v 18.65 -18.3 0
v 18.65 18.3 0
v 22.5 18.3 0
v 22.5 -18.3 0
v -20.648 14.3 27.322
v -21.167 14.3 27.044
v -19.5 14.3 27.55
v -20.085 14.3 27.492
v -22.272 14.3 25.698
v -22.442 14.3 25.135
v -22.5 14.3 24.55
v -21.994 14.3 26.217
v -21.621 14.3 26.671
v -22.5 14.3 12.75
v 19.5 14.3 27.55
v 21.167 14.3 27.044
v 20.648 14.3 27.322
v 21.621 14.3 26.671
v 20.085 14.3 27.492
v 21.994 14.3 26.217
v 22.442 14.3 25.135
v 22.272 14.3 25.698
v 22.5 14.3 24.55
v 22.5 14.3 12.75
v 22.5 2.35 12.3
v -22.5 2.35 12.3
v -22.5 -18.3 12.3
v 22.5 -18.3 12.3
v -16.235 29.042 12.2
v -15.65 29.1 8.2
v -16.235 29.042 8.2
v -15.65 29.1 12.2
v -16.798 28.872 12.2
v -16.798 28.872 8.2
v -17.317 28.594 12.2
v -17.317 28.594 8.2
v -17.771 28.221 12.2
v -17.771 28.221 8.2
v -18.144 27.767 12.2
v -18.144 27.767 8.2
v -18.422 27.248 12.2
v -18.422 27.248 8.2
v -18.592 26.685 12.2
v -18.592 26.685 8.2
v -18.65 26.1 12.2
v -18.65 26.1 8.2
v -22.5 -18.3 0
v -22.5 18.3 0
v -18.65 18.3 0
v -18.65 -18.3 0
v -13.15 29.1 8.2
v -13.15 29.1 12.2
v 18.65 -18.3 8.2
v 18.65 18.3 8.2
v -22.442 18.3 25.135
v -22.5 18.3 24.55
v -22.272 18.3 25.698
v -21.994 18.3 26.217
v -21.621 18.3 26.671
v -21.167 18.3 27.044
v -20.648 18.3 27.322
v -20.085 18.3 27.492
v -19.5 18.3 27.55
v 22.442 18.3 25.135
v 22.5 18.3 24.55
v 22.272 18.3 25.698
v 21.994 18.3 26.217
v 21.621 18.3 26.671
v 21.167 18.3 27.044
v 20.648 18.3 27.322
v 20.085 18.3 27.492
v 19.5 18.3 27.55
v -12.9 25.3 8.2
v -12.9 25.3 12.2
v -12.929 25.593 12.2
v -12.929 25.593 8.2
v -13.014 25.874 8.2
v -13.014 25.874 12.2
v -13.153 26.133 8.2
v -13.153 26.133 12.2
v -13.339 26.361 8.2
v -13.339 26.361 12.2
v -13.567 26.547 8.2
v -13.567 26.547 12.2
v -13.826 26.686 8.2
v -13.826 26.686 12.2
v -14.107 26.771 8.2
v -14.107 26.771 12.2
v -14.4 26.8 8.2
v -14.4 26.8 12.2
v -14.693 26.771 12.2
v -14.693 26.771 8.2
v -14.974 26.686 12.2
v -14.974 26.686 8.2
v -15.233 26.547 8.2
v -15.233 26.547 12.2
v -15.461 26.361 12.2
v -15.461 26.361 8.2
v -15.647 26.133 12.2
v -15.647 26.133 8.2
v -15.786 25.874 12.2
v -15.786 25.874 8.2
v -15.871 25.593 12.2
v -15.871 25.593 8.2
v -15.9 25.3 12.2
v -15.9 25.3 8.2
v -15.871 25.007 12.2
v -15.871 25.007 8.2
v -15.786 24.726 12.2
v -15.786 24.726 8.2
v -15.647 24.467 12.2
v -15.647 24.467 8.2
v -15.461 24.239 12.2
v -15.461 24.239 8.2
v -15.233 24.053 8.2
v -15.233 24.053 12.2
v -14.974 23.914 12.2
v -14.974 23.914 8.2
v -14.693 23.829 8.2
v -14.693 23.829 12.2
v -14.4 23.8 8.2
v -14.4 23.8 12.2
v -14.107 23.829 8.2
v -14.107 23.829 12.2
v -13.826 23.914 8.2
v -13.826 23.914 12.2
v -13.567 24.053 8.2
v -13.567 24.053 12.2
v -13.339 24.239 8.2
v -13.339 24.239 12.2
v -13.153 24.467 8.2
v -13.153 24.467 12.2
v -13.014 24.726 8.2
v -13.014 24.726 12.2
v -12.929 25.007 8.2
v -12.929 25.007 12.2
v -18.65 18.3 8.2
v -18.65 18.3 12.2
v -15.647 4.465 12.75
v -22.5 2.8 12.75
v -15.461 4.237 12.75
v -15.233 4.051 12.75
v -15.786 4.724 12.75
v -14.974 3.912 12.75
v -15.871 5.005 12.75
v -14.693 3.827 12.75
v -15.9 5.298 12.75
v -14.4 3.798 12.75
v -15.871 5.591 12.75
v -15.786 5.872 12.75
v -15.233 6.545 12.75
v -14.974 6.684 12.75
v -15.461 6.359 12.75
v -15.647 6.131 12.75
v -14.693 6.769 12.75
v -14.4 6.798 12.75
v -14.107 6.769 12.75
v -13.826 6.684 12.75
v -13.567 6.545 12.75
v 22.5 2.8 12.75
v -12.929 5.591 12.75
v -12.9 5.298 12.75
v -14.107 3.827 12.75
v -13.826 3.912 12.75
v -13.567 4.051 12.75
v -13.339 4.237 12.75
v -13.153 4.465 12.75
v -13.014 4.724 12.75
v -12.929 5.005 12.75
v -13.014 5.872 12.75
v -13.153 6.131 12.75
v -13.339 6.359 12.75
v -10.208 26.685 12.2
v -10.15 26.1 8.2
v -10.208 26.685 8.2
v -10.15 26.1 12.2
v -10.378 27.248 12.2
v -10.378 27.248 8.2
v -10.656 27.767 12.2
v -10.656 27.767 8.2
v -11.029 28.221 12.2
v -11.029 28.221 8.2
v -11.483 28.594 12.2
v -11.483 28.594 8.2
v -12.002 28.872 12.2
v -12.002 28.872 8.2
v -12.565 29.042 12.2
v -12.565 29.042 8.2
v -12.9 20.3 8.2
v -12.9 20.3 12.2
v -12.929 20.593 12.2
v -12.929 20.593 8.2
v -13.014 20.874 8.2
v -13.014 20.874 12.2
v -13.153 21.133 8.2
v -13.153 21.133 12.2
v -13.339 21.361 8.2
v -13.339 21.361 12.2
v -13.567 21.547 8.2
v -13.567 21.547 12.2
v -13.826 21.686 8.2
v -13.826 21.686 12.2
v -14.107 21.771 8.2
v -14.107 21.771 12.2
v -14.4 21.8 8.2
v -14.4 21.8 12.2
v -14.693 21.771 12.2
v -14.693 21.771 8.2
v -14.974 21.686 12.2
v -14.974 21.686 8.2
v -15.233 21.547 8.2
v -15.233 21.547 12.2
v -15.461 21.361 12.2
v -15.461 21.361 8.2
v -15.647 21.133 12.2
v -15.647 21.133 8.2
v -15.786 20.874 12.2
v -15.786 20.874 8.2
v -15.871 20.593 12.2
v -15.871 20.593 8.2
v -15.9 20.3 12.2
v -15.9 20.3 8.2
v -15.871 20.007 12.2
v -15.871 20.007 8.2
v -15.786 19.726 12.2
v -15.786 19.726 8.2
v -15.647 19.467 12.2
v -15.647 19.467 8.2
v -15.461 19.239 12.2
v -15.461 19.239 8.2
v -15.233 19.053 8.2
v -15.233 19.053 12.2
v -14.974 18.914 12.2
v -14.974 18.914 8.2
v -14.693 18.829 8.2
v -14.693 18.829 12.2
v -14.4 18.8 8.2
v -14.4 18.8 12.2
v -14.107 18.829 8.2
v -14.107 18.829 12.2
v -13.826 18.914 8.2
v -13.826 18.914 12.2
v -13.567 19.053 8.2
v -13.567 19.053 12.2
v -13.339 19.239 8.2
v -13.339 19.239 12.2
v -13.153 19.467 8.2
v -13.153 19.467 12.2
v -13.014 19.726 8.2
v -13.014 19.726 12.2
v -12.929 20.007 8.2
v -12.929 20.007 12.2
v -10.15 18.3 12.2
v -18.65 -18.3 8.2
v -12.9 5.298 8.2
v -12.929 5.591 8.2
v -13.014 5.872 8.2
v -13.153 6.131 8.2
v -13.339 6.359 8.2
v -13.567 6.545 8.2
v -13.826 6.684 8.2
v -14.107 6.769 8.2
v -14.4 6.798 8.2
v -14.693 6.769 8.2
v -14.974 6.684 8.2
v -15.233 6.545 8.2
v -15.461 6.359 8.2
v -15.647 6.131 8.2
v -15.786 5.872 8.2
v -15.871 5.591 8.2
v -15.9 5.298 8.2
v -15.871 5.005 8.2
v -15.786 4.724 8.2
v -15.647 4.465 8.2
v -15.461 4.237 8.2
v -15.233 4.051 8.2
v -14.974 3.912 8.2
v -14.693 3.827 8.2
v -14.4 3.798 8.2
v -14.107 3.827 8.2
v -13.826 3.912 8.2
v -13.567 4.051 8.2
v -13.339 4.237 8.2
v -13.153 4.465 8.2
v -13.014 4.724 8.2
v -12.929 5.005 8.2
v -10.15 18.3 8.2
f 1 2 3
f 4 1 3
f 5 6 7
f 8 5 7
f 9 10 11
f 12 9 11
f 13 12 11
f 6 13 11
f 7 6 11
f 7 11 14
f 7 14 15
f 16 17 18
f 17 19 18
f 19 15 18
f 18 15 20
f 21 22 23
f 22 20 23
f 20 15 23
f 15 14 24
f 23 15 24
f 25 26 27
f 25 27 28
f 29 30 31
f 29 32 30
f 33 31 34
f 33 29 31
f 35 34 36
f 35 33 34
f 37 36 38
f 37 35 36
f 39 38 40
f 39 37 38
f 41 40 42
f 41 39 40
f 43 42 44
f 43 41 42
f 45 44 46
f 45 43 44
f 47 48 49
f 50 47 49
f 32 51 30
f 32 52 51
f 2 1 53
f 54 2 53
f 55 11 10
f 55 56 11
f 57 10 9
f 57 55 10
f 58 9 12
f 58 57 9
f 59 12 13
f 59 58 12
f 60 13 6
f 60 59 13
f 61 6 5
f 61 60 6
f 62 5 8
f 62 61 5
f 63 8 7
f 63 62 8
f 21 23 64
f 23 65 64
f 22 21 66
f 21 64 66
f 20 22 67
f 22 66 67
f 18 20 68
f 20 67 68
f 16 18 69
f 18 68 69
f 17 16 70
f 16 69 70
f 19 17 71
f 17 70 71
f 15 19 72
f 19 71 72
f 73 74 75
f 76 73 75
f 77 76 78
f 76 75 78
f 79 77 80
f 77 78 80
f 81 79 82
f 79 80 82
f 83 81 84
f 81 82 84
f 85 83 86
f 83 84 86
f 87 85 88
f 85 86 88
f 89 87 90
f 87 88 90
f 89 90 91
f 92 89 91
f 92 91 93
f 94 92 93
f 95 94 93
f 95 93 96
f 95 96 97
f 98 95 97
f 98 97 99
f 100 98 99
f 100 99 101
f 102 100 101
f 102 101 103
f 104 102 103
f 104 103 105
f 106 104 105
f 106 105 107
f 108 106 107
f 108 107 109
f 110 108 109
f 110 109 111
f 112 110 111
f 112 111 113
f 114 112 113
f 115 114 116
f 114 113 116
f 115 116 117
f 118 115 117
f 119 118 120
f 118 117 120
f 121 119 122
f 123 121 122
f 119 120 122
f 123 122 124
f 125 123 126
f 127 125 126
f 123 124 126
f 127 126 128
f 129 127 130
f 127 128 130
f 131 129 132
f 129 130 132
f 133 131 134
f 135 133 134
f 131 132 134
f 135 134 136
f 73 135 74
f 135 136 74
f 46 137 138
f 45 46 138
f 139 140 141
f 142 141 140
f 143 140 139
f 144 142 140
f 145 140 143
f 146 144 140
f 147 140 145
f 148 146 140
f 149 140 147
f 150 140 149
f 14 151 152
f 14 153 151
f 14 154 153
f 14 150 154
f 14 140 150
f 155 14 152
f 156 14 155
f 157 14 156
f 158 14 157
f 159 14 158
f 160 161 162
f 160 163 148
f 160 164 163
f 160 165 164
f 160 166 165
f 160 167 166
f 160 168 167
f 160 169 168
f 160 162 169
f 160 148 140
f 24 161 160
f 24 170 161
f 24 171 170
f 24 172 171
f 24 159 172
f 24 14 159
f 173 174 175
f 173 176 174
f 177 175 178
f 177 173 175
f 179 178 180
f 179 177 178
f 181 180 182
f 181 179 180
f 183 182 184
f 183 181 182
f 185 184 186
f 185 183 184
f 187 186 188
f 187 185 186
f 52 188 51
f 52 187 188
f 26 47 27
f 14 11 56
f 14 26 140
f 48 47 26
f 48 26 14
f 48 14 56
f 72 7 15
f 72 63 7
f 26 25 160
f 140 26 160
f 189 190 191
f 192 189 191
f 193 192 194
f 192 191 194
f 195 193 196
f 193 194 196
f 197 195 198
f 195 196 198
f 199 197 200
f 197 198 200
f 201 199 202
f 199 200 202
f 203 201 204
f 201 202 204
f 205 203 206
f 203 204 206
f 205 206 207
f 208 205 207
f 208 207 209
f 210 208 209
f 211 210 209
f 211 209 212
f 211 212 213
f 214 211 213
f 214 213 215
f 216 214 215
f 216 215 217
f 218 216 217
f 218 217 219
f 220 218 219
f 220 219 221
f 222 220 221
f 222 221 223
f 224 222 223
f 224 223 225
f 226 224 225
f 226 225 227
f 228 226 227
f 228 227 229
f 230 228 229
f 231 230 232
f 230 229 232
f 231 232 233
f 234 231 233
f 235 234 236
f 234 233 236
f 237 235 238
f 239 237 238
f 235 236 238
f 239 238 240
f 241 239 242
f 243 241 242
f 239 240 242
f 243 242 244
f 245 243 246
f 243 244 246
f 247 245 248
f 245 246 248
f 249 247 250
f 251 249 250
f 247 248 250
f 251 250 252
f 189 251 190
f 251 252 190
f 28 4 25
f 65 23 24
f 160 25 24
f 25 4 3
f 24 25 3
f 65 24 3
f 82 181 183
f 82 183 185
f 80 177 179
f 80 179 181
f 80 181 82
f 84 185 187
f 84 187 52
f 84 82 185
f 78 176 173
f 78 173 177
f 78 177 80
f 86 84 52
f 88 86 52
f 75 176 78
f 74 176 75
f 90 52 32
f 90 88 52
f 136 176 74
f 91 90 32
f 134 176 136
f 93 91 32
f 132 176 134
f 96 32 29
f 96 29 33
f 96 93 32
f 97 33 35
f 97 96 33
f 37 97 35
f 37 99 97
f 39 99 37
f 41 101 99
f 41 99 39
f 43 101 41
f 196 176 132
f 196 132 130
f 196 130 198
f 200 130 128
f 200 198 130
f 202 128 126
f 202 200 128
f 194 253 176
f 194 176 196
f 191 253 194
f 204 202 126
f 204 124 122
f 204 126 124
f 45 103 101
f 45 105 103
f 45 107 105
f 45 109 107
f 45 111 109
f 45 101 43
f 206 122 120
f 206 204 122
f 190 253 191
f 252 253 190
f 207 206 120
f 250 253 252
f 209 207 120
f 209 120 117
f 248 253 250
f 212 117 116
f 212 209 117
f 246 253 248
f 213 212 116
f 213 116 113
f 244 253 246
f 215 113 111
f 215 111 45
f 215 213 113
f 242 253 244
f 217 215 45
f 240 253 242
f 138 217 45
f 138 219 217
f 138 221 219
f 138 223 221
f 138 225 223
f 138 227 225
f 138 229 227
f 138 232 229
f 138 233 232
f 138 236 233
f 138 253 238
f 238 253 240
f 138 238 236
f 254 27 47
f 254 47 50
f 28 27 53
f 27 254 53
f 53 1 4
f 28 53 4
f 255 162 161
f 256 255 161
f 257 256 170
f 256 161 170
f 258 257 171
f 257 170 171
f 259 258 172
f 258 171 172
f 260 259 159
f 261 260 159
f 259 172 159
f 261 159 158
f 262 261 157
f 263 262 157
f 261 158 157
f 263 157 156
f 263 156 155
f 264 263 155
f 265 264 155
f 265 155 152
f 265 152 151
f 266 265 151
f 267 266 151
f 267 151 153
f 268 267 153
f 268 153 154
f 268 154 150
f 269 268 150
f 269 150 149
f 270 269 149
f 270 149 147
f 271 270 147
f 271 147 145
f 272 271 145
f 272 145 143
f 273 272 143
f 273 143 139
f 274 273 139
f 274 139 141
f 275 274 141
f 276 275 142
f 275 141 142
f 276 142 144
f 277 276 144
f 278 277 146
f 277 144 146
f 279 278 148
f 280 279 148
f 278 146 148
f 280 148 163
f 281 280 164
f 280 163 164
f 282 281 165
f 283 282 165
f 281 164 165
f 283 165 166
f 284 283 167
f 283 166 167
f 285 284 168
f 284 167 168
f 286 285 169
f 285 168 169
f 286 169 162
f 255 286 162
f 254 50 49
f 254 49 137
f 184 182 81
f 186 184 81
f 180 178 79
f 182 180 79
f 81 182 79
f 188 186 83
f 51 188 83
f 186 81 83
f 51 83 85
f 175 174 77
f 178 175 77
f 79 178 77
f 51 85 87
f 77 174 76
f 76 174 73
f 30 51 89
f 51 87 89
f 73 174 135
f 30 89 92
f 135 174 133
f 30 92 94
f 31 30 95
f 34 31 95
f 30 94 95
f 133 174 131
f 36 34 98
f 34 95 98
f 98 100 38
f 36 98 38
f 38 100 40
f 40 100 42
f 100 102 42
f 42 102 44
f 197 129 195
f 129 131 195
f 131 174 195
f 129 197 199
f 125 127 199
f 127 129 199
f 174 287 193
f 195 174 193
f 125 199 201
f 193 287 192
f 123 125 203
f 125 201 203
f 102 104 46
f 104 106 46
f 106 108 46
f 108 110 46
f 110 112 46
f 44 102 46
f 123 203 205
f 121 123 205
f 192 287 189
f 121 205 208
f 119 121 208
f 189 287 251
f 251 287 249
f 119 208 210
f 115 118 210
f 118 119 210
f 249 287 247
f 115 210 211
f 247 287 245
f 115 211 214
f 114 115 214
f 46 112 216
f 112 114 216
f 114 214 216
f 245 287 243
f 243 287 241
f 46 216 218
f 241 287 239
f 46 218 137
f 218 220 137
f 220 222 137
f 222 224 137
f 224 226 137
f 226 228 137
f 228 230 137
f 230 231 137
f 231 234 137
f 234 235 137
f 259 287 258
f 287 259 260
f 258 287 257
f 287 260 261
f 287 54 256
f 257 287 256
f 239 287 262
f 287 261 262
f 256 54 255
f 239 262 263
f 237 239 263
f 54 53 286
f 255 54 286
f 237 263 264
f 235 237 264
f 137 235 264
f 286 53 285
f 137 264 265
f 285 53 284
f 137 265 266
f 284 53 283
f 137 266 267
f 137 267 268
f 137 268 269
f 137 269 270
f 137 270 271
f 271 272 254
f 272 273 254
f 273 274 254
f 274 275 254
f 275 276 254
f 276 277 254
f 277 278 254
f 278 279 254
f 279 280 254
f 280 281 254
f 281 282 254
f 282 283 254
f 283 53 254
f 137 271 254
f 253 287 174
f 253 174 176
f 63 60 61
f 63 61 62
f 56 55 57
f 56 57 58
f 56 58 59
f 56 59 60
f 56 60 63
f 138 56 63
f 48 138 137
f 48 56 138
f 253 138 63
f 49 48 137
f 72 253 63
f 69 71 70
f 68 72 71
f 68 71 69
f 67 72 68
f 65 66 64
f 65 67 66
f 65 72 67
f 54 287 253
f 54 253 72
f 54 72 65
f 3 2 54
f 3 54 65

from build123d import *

# Parameters (mm, degrees)
F0_W        = 45
F0_H        = 36.6
F1_DEPTH    = 12.3
F2_W        = 37.3
F2_H        = 8.2
F3_DEPTH    = 36.601
F4_W        = 45
F4_H        = 16
F5_DEPTH    = 0.45
F6_T4_DEPTH = 47.571682988
F7_W        = 45
F7_H        = 4
F8_DEPTH    = 14.8
F9_R        = 3
F10_W       = 8.5
F10_H       = 4
F11_DEPTH   = 10.8
F12_R       = 3
F13_R       = 1.5
F14_DEPTH   = 25
F15_R       = 1.5
F16_DEPTH   = 25


# Not quite as in the source:
# - a fillet or chamfer that OpenCascade refuses, or shapes differently, is made with other operations: its cross-section is extruded or revolved along the edge and cut away or added


with BuildPart() as f1:
    # F0 (on Top) → F1 (new body)
    with BuildSketch(Plane.XY):
        Rectangle(F0_W, F0_H)
    extrude(amount=F1_DEPTH)

    # F2 (on face) → F3 (cut, through all)
    with BuildSketch(Plane.XZ.offset(18.3)):
        with Locations((0, 4.1)):
            Rectangle(F2_W, F2_H)
    extrude(amount=-F3_DEPTH, mode=Mode.SUBTRACT)

    # F4 (on face) → F5 (join)
    with BuildSketch(Plane.XY.offset(12.3)):
        with Locations((0, 10.3)):
            Rectangle(F4_W, F4_H)
    extrude(amount=F5_DEPTH)

    # F6: chamfer of 0.5 on 1 edges, made by hand


with BuildPart() as f6_tool2:
    # F6_s3 → F6_t4 (new body)
    with BuildSketch(Plane.YZ.offset(-23.785841494)):
        Polygon((2.3, 12.25), (2.8, 12.75), (2.3, 12.75), align=None)
    extrude(amount=F6_T4_DEPTH)

    split(bisect_by=Plane.XY.offset(12.3), keep=Keep.TOP)


with BuildPart() as f1_1:
    add(f1.part)

    # F6_t1: cut F6_tool2
    add(f6_tool2.part, mode=Mode.SUBTRACT)

    # F7 (on face) → F8 (join)
    with BuildSketch(Plane.XY.offset(12.75)):
        with Locations((0, 16.3)):
            Rectangle(F7_W, F7_H)
    extrude(amount=F8_DEPTH)

    # F9
    f9_edges = [f1_1.edges().sort_by_distance(p)[0] for p in [
        (-22.5, 16.3, 27.55),
        (22.5, 16.3, 27.55),
    ]]
    fillet(f9_edges, radius=F9_R)

    # F10 (on face) → F11 (join)
    with BuildSketch(Plane(origin=(0, 18.3, 0), x_dir=(-1, 0, 0), z_dir=(0, 1, 0))):
        with Locations((14.4, 10.2)):
            Rectangle(F10_W, F10_H)
    extrude(amount=F11_DEPTH)

    # F12
    f12_edges = [f1_1.edges().sort_by_distance(p)[0] for p in [
        (-10.15, 29.1, 10.2),
        (-18.65, 29.1, 10.2),
    ]]
    fillet(f12_edges, radius=F12_R)

    # F13 (on face) → F14 (cut)
    with BuildSketch(Plane.XY.offset(12.2)):
        with Locations((-14.4, 25.3)):
            Circle(F13_R)
        with Locations((-14.4, 20.3)):
            Circle(F13_R)
    extrude(amount=-F14_DEPTH, mode=Mode.SUBTRACT)

    # F15 (on face) → F16 (cut)
    with BuildSketch(Plane.XY.offset(12.75)):
        with Locations((-14.4, 5.2980469912)):
            Circle(F15_R)
    extrude(amount=-F16_DEPTH, mode=Mode.SUBTRACT)


solid = f1_1.part
